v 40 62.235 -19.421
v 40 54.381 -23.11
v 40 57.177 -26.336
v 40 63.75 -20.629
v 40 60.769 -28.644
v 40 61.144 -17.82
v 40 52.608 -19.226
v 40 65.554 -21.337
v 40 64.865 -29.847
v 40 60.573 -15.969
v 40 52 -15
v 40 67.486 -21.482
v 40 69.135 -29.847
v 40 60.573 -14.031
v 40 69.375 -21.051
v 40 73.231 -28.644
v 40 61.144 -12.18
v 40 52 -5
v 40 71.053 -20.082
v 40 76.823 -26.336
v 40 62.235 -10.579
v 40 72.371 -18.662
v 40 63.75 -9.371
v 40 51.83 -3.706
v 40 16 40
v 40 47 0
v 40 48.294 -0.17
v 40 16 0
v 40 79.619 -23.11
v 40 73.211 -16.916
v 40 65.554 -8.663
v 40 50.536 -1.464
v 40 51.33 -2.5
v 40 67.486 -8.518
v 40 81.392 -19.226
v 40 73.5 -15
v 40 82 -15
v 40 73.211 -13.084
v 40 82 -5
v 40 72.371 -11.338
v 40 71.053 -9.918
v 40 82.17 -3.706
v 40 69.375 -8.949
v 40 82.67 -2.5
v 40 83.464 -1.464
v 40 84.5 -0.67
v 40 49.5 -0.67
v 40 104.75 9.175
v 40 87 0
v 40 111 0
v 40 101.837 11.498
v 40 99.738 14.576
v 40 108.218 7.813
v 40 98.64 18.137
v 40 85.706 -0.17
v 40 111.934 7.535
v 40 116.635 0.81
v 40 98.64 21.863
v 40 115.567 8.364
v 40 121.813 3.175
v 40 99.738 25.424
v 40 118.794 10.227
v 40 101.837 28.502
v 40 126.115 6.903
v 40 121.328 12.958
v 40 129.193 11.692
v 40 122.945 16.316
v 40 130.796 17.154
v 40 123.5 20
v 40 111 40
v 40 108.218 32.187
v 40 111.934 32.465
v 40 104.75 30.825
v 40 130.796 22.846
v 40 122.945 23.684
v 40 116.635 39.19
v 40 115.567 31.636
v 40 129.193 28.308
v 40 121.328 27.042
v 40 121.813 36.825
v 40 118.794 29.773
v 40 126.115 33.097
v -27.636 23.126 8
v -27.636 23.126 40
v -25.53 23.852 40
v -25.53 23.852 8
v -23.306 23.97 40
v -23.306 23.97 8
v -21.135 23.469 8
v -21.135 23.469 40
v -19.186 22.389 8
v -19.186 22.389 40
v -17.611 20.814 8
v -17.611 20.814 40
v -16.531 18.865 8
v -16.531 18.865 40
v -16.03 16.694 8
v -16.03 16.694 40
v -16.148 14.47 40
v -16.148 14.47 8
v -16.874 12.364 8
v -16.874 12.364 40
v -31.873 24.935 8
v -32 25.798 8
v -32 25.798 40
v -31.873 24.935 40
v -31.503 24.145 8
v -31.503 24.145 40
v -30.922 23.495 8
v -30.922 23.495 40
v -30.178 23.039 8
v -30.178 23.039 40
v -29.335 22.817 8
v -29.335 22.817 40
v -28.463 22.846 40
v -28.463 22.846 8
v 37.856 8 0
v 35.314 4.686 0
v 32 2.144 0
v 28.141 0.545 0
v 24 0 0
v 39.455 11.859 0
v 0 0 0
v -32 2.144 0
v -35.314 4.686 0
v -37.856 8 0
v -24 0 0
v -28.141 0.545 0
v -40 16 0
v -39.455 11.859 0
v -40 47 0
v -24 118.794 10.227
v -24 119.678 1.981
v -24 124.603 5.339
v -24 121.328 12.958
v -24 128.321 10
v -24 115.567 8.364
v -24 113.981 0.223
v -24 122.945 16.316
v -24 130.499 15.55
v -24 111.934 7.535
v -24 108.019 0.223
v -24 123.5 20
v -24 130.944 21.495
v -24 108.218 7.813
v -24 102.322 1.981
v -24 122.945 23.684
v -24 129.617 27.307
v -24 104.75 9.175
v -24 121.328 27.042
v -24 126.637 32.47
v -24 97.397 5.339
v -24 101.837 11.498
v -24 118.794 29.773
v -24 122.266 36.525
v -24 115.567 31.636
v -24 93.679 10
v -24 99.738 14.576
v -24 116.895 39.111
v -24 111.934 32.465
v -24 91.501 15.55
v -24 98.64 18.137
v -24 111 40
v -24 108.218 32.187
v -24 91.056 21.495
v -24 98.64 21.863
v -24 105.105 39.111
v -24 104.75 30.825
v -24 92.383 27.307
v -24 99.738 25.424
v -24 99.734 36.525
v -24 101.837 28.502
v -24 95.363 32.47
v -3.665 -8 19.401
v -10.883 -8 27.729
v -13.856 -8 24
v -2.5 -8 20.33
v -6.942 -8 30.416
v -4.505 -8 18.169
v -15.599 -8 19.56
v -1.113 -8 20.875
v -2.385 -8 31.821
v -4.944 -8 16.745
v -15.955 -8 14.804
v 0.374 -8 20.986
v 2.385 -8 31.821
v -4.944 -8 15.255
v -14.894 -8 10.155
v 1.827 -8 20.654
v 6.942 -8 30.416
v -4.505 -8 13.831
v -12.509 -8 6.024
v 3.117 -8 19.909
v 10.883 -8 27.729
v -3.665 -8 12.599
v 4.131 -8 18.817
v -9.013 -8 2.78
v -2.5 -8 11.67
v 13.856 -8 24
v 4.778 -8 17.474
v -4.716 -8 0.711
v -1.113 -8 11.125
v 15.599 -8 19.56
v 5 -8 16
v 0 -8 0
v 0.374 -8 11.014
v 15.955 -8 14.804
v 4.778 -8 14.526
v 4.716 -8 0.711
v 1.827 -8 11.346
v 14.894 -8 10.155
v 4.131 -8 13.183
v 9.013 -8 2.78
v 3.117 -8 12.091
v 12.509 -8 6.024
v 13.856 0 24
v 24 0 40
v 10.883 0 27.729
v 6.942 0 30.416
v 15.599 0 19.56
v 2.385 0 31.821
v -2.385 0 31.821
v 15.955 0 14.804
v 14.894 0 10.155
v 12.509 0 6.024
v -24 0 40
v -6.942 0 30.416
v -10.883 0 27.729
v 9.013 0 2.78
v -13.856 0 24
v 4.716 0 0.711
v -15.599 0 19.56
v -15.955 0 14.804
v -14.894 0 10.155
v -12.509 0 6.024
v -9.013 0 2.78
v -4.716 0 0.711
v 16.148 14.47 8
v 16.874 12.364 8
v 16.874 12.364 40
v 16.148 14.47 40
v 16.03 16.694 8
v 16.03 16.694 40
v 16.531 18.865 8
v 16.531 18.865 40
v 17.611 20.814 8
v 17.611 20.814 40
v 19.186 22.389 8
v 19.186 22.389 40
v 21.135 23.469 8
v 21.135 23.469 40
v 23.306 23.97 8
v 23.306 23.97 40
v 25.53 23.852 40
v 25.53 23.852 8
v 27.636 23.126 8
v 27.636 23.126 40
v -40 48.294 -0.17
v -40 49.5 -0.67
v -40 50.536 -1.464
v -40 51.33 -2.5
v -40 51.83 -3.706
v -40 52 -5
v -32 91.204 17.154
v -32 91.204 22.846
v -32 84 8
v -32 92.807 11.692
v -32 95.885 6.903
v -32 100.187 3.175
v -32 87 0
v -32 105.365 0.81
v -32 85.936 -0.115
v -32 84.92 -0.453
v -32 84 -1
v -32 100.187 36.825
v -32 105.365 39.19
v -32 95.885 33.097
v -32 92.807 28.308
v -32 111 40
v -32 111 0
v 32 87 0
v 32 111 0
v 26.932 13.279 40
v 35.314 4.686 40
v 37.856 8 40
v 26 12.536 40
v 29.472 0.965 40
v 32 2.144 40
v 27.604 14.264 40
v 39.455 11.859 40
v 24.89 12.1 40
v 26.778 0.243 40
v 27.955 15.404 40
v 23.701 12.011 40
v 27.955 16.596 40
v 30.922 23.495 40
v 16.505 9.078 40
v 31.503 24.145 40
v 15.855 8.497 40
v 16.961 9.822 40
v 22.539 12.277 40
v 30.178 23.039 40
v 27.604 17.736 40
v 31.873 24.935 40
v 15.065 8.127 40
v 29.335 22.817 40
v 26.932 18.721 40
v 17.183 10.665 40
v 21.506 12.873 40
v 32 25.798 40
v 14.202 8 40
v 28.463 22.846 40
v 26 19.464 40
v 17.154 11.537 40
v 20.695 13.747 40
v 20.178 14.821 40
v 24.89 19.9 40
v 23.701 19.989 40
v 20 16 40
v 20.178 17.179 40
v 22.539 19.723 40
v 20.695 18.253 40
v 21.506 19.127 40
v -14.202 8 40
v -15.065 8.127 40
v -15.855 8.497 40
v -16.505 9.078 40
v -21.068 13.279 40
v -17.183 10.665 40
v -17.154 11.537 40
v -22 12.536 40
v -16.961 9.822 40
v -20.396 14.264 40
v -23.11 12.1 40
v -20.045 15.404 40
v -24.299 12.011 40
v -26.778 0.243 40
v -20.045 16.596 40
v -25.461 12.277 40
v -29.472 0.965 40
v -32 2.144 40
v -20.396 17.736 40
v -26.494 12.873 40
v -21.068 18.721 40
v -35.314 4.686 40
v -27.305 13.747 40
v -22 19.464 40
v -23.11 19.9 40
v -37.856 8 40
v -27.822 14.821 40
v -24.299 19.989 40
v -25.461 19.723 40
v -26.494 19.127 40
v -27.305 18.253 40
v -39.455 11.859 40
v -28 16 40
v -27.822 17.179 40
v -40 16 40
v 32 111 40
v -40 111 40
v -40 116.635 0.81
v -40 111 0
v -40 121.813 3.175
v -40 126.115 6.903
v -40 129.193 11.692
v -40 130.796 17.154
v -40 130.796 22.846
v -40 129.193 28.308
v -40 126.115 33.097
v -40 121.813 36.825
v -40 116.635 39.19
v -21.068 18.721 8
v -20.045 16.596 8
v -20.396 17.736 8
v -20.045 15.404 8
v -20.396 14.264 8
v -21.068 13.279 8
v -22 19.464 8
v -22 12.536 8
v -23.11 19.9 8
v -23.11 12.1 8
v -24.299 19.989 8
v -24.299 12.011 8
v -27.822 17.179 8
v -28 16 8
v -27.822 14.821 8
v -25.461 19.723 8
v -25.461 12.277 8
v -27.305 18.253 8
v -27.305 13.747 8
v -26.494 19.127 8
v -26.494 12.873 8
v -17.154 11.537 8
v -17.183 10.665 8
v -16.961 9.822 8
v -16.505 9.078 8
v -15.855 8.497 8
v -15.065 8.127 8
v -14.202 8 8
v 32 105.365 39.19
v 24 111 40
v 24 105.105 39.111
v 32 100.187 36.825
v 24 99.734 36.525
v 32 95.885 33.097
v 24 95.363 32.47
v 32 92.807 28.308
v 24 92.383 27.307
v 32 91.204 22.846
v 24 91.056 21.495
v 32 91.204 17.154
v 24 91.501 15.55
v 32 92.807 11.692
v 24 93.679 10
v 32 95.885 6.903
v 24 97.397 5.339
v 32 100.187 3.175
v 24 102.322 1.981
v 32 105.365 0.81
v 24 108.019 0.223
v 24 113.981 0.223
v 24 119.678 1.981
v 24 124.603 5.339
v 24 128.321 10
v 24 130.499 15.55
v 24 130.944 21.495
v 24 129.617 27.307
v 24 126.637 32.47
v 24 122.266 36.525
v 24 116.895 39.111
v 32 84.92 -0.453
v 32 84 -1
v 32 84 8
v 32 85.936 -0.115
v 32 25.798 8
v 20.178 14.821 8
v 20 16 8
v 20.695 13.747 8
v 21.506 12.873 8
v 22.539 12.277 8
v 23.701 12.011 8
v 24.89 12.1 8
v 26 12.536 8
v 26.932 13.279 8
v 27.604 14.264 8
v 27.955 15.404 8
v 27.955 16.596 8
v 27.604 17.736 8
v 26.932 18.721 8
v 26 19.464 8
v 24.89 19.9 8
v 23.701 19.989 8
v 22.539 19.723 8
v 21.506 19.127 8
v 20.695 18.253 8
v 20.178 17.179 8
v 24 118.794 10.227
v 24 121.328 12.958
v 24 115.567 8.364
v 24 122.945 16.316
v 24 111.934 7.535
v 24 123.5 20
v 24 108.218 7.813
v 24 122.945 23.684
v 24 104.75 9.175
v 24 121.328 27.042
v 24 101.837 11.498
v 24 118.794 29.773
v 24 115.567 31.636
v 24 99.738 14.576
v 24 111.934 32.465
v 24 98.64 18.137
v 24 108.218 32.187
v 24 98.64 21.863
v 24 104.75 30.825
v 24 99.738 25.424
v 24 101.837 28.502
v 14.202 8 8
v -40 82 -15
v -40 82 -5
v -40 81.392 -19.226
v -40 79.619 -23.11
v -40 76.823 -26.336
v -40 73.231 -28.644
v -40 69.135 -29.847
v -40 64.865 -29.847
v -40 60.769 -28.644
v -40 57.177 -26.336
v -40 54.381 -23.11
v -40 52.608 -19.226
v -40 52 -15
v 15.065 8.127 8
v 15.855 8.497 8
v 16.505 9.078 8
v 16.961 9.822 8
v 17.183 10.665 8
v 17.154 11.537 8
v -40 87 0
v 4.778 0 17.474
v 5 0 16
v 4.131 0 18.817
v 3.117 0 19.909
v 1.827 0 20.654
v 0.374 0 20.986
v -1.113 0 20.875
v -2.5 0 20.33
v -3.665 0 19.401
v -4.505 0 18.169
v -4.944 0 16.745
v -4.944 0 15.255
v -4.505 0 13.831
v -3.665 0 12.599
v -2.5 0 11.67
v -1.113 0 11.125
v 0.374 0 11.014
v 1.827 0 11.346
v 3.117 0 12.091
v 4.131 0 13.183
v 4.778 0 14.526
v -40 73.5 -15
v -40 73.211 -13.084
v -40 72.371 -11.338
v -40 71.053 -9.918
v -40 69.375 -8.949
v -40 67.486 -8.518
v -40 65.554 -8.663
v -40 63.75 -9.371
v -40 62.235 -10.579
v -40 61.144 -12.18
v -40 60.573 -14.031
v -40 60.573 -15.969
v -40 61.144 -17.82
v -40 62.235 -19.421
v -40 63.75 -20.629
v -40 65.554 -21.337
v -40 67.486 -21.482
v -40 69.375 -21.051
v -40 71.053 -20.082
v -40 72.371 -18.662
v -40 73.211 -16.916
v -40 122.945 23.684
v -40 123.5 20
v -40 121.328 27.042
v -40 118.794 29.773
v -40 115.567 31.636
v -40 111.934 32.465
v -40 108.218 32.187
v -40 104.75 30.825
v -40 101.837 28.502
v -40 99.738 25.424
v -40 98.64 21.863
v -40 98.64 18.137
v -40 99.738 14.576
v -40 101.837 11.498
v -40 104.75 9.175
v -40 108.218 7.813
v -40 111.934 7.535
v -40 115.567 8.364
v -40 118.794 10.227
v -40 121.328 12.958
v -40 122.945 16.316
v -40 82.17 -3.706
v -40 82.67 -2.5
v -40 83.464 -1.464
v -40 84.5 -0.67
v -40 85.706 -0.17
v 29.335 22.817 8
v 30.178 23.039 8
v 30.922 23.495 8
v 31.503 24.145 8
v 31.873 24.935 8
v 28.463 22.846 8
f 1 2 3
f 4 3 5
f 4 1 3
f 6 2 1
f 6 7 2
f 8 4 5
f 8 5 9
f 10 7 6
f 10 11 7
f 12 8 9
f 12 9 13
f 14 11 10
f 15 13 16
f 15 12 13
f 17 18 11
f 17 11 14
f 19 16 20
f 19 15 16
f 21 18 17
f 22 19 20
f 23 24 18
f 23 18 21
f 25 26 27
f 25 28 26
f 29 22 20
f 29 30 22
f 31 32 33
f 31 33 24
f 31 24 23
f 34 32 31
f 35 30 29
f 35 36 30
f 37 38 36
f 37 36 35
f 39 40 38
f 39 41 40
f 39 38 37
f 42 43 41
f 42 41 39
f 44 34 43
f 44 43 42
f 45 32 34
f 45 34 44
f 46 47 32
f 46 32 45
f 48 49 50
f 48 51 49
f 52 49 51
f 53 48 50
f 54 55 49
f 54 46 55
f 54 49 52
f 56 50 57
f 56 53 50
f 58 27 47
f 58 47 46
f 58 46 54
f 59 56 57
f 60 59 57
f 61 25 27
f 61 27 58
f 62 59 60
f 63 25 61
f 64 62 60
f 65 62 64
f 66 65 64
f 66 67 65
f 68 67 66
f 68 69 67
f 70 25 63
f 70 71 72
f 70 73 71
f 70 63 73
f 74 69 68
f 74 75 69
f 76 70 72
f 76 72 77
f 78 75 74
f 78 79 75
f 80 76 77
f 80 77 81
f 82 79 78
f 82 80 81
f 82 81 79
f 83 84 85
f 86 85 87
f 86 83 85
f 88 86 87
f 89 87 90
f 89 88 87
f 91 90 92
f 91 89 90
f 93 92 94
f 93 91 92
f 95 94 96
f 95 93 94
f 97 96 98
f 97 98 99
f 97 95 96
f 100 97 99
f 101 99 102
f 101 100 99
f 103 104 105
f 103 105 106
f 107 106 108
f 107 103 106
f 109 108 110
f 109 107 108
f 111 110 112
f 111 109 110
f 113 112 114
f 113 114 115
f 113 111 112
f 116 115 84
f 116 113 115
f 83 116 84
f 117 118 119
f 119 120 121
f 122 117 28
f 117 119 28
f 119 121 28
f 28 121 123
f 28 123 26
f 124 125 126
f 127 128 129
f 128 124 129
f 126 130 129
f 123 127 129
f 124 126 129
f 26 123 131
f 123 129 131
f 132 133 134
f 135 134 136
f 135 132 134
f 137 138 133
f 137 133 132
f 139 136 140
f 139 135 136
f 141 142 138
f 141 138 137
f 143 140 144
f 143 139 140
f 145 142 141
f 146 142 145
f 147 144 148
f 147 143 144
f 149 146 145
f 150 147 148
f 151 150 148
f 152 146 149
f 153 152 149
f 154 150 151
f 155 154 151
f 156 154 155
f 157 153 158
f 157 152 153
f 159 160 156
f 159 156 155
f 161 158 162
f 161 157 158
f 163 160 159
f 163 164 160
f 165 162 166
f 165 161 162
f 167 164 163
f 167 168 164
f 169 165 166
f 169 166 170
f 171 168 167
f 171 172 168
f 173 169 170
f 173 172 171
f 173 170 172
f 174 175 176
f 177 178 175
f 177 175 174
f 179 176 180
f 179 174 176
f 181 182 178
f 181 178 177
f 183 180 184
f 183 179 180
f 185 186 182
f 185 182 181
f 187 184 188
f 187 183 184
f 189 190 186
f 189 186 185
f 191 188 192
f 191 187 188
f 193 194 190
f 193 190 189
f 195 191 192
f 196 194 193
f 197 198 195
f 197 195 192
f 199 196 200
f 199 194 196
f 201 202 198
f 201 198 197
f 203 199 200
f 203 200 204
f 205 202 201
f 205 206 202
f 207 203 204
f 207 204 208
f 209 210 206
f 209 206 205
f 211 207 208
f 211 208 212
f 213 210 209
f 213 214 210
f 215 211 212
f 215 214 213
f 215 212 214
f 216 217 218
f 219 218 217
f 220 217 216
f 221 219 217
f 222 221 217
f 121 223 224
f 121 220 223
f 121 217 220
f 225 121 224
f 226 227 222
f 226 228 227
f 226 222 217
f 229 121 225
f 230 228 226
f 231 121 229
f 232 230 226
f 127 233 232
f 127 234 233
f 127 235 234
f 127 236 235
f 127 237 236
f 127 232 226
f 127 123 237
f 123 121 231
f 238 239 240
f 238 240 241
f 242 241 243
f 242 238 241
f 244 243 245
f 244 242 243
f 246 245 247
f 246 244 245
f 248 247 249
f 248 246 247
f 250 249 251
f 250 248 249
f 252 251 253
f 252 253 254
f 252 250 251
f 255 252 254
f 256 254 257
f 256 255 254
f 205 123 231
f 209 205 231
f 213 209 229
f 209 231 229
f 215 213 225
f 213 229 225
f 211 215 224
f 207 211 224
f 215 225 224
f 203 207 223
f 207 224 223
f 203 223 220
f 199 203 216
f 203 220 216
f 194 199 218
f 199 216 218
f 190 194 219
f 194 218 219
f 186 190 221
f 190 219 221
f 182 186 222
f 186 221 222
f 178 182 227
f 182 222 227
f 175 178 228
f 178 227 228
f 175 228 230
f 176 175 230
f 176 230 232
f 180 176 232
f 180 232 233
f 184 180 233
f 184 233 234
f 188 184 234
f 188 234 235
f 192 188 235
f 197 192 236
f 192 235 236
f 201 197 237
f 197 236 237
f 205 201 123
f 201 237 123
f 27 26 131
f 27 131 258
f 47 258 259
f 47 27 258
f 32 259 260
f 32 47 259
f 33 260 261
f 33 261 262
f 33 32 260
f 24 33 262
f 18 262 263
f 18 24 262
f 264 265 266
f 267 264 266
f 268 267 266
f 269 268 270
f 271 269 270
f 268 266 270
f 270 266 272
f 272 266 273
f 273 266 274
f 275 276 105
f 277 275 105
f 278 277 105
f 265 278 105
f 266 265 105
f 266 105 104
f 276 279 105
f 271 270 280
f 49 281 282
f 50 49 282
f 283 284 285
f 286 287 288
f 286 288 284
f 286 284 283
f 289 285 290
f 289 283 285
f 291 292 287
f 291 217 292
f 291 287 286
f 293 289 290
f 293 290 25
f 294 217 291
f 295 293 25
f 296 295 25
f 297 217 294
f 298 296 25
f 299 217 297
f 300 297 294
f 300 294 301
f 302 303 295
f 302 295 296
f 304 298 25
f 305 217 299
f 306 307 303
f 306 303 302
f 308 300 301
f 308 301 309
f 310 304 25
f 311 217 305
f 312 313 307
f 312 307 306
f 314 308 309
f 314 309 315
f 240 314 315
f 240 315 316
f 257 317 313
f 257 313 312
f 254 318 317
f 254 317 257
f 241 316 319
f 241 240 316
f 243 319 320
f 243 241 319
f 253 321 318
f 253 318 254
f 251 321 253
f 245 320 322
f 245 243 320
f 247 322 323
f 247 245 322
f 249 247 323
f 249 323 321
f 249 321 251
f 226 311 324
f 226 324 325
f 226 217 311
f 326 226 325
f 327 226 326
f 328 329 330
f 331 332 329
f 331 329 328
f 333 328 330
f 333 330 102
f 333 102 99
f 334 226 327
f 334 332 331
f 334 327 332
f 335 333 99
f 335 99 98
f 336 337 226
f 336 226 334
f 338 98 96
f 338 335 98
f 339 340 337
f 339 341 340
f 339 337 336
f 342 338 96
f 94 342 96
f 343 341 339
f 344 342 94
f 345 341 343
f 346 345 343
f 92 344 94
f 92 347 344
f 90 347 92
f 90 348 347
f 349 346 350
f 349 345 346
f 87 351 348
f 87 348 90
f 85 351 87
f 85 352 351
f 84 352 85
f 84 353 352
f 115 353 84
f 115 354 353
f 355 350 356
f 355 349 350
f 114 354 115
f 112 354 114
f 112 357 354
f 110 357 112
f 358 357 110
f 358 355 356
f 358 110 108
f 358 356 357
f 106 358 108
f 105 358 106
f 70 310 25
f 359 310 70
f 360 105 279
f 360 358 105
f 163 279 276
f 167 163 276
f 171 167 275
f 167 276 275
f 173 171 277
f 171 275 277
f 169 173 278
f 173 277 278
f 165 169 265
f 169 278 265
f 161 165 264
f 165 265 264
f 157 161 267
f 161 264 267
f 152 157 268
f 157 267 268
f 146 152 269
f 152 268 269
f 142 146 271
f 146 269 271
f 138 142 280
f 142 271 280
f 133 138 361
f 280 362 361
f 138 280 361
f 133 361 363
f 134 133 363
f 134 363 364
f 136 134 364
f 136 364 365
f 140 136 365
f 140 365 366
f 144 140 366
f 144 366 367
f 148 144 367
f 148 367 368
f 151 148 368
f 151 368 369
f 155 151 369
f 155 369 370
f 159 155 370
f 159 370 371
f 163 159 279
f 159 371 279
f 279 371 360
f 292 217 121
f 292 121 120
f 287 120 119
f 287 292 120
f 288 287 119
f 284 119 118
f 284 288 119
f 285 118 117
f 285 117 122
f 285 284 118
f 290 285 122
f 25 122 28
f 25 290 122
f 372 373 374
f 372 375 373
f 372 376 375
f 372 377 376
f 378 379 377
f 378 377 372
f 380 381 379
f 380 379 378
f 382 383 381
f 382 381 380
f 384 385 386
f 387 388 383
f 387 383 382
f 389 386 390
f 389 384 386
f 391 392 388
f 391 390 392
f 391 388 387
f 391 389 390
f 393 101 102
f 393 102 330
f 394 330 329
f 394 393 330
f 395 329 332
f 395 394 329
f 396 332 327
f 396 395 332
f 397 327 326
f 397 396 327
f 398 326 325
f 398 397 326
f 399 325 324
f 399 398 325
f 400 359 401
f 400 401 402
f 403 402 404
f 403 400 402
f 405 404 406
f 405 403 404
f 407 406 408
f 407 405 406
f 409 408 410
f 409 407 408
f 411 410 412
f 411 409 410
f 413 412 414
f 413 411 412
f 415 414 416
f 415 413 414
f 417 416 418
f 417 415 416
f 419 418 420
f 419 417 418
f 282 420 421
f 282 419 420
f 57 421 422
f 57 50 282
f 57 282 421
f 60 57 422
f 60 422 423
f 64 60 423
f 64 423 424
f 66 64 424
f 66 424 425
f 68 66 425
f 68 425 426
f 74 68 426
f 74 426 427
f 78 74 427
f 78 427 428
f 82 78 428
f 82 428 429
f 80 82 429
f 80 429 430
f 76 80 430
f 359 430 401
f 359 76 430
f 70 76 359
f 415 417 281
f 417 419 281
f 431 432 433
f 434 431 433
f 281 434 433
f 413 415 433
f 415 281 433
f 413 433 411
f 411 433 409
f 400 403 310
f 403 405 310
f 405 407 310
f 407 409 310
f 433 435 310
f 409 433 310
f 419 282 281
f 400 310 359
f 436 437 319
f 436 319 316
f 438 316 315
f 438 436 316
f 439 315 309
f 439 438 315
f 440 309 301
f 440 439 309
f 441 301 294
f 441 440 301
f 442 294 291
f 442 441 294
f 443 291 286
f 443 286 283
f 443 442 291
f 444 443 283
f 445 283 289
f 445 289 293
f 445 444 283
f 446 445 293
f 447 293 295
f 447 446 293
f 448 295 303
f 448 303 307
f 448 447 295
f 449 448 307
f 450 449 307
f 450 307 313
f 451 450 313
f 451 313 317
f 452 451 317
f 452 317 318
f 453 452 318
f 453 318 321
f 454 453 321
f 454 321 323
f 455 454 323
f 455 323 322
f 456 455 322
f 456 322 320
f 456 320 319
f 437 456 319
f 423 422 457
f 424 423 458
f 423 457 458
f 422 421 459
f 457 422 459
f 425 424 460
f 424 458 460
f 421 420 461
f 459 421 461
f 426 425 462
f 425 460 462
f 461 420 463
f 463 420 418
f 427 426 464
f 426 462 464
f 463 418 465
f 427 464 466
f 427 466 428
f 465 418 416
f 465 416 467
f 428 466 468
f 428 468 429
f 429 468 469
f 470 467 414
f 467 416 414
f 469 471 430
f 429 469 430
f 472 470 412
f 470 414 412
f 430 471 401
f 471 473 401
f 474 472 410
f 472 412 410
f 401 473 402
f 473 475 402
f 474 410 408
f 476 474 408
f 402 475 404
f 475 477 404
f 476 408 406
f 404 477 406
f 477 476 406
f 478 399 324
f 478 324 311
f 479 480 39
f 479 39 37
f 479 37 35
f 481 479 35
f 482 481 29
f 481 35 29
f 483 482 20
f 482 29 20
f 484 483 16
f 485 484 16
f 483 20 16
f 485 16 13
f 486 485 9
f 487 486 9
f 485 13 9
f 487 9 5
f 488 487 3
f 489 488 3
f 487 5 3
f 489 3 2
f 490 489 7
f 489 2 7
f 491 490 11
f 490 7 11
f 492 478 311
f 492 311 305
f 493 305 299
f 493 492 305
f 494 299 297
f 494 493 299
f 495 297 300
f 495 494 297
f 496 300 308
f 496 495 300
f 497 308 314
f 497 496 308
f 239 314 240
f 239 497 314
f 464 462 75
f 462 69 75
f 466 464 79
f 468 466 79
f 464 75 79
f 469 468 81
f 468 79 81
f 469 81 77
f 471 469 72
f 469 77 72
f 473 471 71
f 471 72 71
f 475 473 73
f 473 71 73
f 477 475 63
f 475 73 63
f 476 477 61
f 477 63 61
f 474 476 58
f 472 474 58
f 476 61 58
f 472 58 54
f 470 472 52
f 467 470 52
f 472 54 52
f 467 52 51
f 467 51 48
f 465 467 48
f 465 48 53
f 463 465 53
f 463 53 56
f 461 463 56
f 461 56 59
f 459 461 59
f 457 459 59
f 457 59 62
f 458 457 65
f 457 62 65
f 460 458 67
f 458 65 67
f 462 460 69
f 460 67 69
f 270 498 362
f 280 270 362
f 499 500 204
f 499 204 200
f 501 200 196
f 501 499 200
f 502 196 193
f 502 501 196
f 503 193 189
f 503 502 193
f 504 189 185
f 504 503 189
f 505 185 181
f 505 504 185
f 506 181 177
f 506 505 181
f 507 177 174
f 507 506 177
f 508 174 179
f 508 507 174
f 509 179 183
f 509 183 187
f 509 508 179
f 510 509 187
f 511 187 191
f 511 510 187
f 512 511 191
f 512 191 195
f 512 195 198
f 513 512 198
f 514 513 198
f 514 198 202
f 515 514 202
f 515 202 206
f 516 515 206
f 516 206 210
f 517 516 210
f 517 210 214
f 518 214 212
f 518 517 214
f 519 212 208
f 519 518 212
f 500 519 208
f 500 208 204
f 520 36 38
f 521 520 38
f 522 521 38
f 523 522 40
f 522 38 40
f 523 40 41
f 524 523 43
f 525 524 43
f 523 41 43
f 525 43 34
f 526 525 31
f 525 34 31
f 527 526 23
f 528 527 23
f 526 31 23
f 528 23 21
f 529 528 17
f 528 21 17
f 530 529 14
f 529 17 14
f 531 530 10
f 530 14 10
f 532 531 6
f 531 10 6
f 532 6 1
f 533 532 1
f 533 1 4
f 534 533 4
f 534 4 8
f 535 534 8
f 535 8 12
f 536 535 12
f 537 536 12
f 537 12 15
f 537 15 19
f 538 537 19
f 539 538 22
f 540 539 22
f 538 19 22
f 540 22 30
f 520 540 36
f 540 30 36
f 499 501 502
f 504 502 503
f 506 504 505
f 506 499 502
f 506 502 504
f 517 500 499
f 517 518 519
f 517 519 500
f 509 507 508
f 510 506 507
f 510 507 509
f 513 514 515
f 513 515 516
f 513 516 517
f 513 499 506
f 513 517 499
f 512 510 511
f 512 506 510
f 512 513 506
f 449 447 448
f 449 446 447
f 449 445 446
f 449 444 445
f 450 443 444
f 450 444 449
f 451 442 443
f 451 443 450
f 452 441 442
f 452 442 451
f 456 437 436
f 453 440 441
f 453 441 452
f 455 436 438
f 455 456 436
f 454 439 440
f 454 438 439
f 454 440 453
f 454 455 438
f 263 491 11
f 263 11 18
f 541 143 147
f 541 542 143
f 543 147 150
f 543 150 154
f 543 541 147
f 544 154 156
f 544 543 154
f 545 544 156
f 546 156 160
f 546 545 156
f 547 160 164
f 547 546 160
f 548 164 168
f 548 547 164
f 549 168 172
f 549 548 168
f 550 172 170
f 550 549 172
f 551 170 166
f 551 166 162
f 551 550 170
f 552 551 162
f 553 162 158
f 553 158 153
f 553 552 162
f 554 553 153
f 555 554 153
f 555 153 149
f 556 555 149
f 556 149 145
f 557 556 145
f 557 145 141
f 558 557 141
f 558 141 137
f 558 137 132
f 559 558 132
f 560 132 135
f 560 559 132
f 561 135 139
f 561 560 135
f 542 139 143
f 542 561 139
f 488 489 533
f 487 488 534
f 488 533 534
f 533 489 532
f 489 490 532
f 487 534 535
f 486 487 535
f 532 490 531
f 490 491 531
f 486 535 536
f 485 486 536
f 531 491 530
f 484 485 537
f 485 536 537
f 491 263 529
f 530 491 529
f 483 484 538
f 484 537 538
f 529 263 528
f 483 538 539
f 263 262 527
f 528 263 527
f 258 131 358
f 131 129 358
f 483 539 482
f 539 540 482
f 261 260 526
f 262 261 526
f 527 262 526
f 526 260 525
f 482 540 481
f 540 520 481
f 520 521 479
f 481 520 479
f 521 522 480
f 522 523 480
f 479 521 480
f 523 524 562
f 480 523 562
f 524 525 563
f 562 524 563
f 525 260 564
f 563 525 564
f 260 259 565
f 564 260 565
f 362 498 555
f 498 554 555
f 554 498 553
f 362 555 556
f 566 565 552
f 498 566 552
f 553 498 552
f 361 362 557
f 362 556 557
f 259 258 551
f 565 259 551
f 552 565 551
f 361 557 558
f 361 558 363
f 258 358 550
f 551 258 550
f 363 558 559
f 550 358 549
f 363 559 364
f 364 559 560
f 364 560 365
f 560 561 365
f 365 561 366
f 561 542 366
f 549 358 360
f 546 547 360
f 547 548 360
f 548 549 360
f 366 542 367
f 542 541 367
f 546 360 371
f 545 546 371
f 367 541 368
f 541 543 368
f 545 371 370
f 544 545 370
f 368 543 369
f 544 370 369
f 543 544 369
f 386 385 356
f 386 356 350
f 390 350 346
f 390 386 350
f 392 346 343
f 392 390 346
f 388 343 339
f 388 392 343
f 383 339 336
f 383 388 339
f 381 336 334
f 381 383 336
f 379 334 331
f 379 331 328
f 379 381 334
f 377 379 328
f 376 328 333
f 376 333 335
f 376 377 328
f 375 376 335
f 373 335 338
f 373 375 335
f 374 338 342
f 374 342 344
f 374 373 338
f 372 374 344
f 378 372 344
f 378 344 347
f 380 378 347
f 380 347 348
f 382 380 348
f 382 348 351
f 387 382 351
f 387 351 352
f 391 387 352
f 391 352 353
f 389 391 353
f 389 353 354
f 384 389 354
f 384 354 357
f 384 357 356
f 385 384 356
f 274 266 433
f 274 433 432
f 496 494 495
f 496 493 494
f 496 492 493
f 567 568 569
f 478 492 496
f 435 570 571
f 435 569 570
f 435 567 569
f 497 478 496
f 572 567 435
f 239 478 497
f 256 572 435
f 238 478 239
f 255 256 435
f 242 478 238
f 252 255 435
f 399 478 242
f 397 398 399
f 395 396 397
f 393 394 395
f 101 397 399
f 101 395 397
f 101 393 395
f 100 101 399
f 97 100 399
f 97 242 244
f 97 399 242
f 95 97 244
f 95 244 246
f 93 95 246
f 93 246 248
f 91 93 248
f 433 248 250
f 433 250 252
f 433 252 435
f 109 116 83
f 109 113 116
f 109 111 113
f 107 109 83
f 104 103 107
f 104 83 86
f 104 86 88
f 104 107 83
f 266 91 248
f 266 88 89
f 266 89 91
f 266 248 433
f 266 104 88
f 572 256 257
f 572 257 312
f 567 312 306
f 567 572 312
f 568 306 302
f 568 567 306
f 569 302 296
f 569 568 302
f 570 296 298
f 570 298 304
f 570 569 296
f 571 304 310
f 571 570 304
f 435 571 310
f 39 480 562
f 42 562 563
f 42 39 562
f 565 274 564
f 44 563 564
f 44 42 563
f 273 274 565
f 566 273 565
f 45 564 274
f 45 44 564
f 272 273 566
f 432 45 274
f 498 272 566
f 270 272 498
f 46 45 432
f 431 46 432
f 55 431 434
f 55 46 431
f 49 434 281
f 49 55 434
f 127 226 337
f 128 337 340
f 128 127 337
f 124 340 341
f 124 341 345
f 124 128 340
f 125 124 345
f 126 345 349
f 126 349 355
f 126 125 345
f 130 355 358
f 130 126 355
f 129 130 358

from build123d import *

# Parameters (mm, degrees)
SKETCH1_W           = 84
SKETCH1_H           = 80
BOSS_EXTRUDE1_DEPTH = 8
SKETCH2_R           = 12.5
BOSS_EXTRUDE3_DEPTH = 8
FILLET1_R           = 16
SKETCH3_R           = 4
BOSS_EXTRUDE4_DEPTH = 40
SKETCH4_R           = 20
SKETCH4_R_2         = 12.5
BOSS_EXTRUDE5_DEPTH = 8
SKETCH5_R           = 6.5
BOSS_EXTRUDE6_DEPTH = 80
FILLET2_R           = 5
SKETCH6_R           = 16
SKETCH6_R_2         = 5
BOSS_EXTRUDE7_DEPTH = 8


with BuildPart() as part:
    # Sketch1 → Boss-Extrude1 (new body)
    with BuildSketch(Plane(origin=(0, 0, 0), x_dir=(0, 1, 0), z_dir=(0, 0, 1))):
        with Locations((42, 0)):
            Rectangle(SKETCH1_W, SKETCH1_H)
    extrude(amount=BOSS_EXTRUDE1_DEPTH)

    # Sketch2 → Boss-Extrude3 (add)
    with BuildSketch(Plane.YZ.offset(40)):
        with BuildLine():
            Line((0, 0), (0, 40))
            Line((0, 40), (111, 40))
            ThreePointArc((111, 40), (131, 20), (111, 0))
            Line((111, 0), (0, 0))
        make_face()
        with Locations((111, 20)):
            Circle(SKETCH2_R, mode=Mode.SUBTRACT)
    boss_extrude3 = extrude(amount=-BOSS_EXTRUDE3_DEPTH)

    # Mirror1: Boss-Extrude3 across plane
    add(boss_extrude3.mirror(Plane(origin=(0, 0, 0), x_dir=(0, 0, 1), z_dir=(1, 0, 0))))

    # Fillet1
    fillet1_edges = [part.edges().sort_by_distance(p)[0] for p in [
        (-40, 0, 20),
        (40, 0, 20),
    ]]
    fillet(fillet1_edges, radius=FILLET1_R)

    # Sketch3 → Boss-Extrude4 (add)
    with BuildSketch(Plane(origin=(0, 0, 0), x_dir=(0, 1, 0), z_dir=(0, 0, 1))):
        with BuildLine():
            Line((8, 14.202041029), (8, -14.202041029))
            ThreePointArc((8, -14.202041029), (9.433301096, -16.760449625), (12.363636364, -16.874211657))
            ThreePointArc((12.363636364, -16.874211657), (21.656854249, -18.343145751), (23.125788343, -27.636363636))
            ThreePointArc((23.125788343, -27.636363636), (23.239550375, -30.566698904), (25.797958971, -32))
            Line((25.797958971, -32), (84, -32))
            Line((84, -32), (84, -40))
            Line((84, -40), (16, -40))
            ThreePointArc((16, -40), (4.686291501, -35.313708499), (0, -24))
            Line((0, -24), (0, 24))
            ThreePointArc((0, 24), (4.686291501, 35.313708499), (16, 40))
            Line((16, 40), (84, 40))
            Line((84, 40), (84, 32))
            Line((84, 32), (25.797958971, 32))
            ThreePointArc((25.797958971, 32), (23.239550375, 30.566698904), (23.125788343, 27.636363636))
            ThreePointArc((23.125788343, 27.636363636), (21.656854249, 18.343145751), (12.363636364, 16.874211657))
            ThreePointArc((12.363636364, 16.874211657), (9.433301096, 16.760449625), (8, 14.202041029))
        make_face()
        with Locations(Location((16, 24, 0), (0, 0, 90))):
            Circle(SKETCH3_R, mode=Mode.SUBTRACT)
        with Locations(Location((16, -24, 0), (0, 0, 90))):
            Circle(SKETCH3_R, mode=Mode.SUBTRACT)
    extrude(amount=BOSS_EXTRUDE4_DEPTH)

    # Sketch4 → Boss-Extrude5 (add)
    with BuildSketch(Plane.YZ.offset(-32)):
        with Locations(Location((111, 20, 0), (0, 0, 90))):
            Circle(SKETCH4_R)
        with Locations((111, 20)):
            Circle(SKETCH4_R_2, mode=Mode.SUBTRACT)
    boss_extrude5 = extrude(amount=BOSS_EXTRUDE5_DEPTH)

    # Mirror2: Boss-Extrude5 across plane
    add(boss_extrude5.mirror(Plane(origin=(0, 0, 0), x_dir=(0, 0, 1), z_dir=(1, 0, 0))))

    # Sketch5 → Boss-Extrude6 (add)
    with BuildSketch(Plane.YZ.offset(40)):
        with BuildLine():
            Line((52, -15), (52, 0))
            Line((52, 0), (82, 0))
            Line((82, 0), (82, -15))
            ThreePointArc((82, -15), (67, -30), (52, -15))
        make_face()
        with Locations((67, -15)):
            Circle(SKETCH5_R, mode=Mode.SUBTRACT)
    extrude(amount=-BOSS_EXTRUDE6_DEPTH)

    # Fillet2
    # the kernel refuses this fillet: 5 mm, written as the material it adds along each edge
    with BuildSketch(Plane(origin=(40, 82, 0), x_dir=(0, 1, 0), z_dir=(-1, 0, 0))) as fillet2_piece_1_section:
        with BuildLine():
            CenterArc((FILLET2_R, FILLET2_R), FILLET2_R, 180, 90)
            Line((0, FILLET2_R), (0, 0))
            Line((0, 0), (FILLET2_R, 0))
        make_face()
    fillet2_piece_1 = extrude(amount=80, mode=Mode.PRIVATE)
    fillet2_piece_1 = split(fillet2_piece_1, bisect_by=Plane(origin=(32, 84.91705828, -0.211887472), z_dir=(1, 0, 0)), keep=Keep.TOP, mode=Mode.PRIVATE)
    fillet2_piece_1 = split(fillet2_piece_1, bisect_by=Plane(origin=(36, 84, -0.211887472), z_dir=(0, 1, 0)), keep=Keep.TOP, mode=Mode.PRIVATE)
    add(fillet2_piece_1)
    with BuildSketch(Plane(origin=(40, 82, 0), x_dir=(0, 1, 0), z_dir=(-1, 0, 0))) as fillet2_piece_2_section:
        with BuildLine():
            CenterArc((FILLET2_R, FILLET2_R), FILLET2_R, 180, 90)
            Line((0, FILLET2_R), (0, 0))
            Line((0, 0), (FILLET2_R, 0))
        make_face()
    fillet2_piece_2 = extrude(amount=80, mode=Mode.PRIVATE)
    fillet2_piece_2 = split(fillet2_piece_2, bisect_by=Plane(origin=(32, 82.693888299, -1.35777961), z_dir=(1, 0, 0)), keep=Keep.TOP, mode=Mode.PRIVATE)
    fillet2_piece_2 = split(fillet2_piece_2, bisect_by=Plane(origin=(36, 84, -1.35777961), z_dir=(0, -1, 0)), keep=Keep.TOP, mode=Mode.PRIVATE)
    add(fillet2_piece_2)
    with BuildSketch(Plane(origin=(40, 82, 0), x_dir=(0, 1, 0), z_dir=(-1, 0, 0))) as fillet2_piece_3_section:
        with BuildLine():
            CenterArc((FILLET2_R, FILLET2_R), FILLET2_R, 180, 90)
            Line((0, FILLET2_R), (0, 0))
            Line((0, 0), (FILLET2_R, 0))
        make_face()
    fillet2_piece_3 = extrude(amount=80, mode=Mode.PRIVATE)
    fillet2_piece_3 = split(fillet2_piece_3, bisect_by=Plane(origin=(32, 82.693888299, -1.35777961), z_dir=(-1, 0, 0)), keep=Keep.TOP, mode=Mode.PRIVATE)
    fillet2_piece_3 = split(fillet2_piece_3, bisect_by=Plane(origin=(-32, 82.693888299, -1.35777961), z_dir=(1, 0, 0)), keep=Keep.TOP, mode=Mode.PRIVATE)
    fillet2_piece_3 = split(fillet2_piece_3, bisect_by=Plane(origin=(0, 84, -1.35777961), z_dir=(0, -1, 0)), keep=Keep.TOP, mode=Mode.PRIVATE)
    add(fillet2_piece_3)
    with BuildSketch(Plane(origin=(40, 82, 0), x_dir=(0, 1, 0), z_dir=(-1, 0, 0))) as fillet2_piece_4_section:
        with BuildLine():
            CenterArc((FILLET2_R, FILLET2_R), FILLET2_R, 180, 90)
            Line((0, FILLET2_R), (0, 0))
            Line((0, 0), (FILLET2_R, 0))
        make_face()
    fillet2_piece_4 = extrude(amount=80, mode=Mode.PRIVATE)
    fillet2_piece_4 = split(fillet2_piece_4, bisect_by=Plane(origin=(-32, 84.91705828, -0.211887472), z_dir=(-1, 0, 0)), keep=Keep.TOP, mode=Mode.PRIVATE)
    fillet2_piece_4 = split(fillet2_piece_4, bisect_by=Plane(origin=(-36, 84, -0.211887472), z_dir=(0, 1, 0)), keep=Keep.TOP, mode=Mode.PRIVATE)
    add(fillet2_piece_4)
    with BuildSketch(Plane(origin=(40, 82, 0), x_dir=(0, 1, 0), z_dir=(-1, 0, 0))) as fillet2_piece_5_section:
        with BuildLine():
            CenterArc((FILLET2_R, FILLET2_R), FILLET2_R, 180, 90)
            Line((0, FILLET2_R), (0, 0))
            Line((0, 0), (FILLET2_R, 0))
        make_face()
    fillet2_piece_5 = extrude(amount=80, mode=Mode.PRIVATE)
    fillet2_piece_5 = split(fillet2_piece_5, bisect_by=Plane(origin=(-32, 82.693888299, -1.35777961), z_dir=(-1, 0, 0)), keep=Keep.TOP, mode=Mode.PRIVATE)
    fillet2_piece_5 = split(fillet2_piece_5, bisect_by=Plane(origin=(-36, 84, -1.35777961), z_dir=(0, -1, 0)), keep=Keep.TOP, mode=Mode.PRIVATE)
    add(fillet2_piece_5)
    with BuildSketch(Plane(origin=(40, 52, 0), x_dir=(0, -1, 0), z_dir=(-1, 0, 0))) as fillet2_piece_6:
        with BuildLine():
            CenterArc((FILLET2_R, -FILLET2_R), FILLET2_R, 90, 90)
            Line((0, -FILLET2_R), (0, 0))
            Line((0, 0), (FILLET2_R, 0))
        make_face()
    extrude(amount=80)

    # Sketch6 → Boss-Extrude7 (add)
    with BuildSketch(Plane.XZ):
        with Locations(Location((0, 16, 0), (0, 0, 270))):
            Circle(SKETCH6_R)
        with Locations((0, 16)):
            Circle(SKETCH6_R_2, mode=Mode.SUBTRACT)
    extrude(amount=BOSS_EXTRUDE7_DEPTH)


solid = part.part
